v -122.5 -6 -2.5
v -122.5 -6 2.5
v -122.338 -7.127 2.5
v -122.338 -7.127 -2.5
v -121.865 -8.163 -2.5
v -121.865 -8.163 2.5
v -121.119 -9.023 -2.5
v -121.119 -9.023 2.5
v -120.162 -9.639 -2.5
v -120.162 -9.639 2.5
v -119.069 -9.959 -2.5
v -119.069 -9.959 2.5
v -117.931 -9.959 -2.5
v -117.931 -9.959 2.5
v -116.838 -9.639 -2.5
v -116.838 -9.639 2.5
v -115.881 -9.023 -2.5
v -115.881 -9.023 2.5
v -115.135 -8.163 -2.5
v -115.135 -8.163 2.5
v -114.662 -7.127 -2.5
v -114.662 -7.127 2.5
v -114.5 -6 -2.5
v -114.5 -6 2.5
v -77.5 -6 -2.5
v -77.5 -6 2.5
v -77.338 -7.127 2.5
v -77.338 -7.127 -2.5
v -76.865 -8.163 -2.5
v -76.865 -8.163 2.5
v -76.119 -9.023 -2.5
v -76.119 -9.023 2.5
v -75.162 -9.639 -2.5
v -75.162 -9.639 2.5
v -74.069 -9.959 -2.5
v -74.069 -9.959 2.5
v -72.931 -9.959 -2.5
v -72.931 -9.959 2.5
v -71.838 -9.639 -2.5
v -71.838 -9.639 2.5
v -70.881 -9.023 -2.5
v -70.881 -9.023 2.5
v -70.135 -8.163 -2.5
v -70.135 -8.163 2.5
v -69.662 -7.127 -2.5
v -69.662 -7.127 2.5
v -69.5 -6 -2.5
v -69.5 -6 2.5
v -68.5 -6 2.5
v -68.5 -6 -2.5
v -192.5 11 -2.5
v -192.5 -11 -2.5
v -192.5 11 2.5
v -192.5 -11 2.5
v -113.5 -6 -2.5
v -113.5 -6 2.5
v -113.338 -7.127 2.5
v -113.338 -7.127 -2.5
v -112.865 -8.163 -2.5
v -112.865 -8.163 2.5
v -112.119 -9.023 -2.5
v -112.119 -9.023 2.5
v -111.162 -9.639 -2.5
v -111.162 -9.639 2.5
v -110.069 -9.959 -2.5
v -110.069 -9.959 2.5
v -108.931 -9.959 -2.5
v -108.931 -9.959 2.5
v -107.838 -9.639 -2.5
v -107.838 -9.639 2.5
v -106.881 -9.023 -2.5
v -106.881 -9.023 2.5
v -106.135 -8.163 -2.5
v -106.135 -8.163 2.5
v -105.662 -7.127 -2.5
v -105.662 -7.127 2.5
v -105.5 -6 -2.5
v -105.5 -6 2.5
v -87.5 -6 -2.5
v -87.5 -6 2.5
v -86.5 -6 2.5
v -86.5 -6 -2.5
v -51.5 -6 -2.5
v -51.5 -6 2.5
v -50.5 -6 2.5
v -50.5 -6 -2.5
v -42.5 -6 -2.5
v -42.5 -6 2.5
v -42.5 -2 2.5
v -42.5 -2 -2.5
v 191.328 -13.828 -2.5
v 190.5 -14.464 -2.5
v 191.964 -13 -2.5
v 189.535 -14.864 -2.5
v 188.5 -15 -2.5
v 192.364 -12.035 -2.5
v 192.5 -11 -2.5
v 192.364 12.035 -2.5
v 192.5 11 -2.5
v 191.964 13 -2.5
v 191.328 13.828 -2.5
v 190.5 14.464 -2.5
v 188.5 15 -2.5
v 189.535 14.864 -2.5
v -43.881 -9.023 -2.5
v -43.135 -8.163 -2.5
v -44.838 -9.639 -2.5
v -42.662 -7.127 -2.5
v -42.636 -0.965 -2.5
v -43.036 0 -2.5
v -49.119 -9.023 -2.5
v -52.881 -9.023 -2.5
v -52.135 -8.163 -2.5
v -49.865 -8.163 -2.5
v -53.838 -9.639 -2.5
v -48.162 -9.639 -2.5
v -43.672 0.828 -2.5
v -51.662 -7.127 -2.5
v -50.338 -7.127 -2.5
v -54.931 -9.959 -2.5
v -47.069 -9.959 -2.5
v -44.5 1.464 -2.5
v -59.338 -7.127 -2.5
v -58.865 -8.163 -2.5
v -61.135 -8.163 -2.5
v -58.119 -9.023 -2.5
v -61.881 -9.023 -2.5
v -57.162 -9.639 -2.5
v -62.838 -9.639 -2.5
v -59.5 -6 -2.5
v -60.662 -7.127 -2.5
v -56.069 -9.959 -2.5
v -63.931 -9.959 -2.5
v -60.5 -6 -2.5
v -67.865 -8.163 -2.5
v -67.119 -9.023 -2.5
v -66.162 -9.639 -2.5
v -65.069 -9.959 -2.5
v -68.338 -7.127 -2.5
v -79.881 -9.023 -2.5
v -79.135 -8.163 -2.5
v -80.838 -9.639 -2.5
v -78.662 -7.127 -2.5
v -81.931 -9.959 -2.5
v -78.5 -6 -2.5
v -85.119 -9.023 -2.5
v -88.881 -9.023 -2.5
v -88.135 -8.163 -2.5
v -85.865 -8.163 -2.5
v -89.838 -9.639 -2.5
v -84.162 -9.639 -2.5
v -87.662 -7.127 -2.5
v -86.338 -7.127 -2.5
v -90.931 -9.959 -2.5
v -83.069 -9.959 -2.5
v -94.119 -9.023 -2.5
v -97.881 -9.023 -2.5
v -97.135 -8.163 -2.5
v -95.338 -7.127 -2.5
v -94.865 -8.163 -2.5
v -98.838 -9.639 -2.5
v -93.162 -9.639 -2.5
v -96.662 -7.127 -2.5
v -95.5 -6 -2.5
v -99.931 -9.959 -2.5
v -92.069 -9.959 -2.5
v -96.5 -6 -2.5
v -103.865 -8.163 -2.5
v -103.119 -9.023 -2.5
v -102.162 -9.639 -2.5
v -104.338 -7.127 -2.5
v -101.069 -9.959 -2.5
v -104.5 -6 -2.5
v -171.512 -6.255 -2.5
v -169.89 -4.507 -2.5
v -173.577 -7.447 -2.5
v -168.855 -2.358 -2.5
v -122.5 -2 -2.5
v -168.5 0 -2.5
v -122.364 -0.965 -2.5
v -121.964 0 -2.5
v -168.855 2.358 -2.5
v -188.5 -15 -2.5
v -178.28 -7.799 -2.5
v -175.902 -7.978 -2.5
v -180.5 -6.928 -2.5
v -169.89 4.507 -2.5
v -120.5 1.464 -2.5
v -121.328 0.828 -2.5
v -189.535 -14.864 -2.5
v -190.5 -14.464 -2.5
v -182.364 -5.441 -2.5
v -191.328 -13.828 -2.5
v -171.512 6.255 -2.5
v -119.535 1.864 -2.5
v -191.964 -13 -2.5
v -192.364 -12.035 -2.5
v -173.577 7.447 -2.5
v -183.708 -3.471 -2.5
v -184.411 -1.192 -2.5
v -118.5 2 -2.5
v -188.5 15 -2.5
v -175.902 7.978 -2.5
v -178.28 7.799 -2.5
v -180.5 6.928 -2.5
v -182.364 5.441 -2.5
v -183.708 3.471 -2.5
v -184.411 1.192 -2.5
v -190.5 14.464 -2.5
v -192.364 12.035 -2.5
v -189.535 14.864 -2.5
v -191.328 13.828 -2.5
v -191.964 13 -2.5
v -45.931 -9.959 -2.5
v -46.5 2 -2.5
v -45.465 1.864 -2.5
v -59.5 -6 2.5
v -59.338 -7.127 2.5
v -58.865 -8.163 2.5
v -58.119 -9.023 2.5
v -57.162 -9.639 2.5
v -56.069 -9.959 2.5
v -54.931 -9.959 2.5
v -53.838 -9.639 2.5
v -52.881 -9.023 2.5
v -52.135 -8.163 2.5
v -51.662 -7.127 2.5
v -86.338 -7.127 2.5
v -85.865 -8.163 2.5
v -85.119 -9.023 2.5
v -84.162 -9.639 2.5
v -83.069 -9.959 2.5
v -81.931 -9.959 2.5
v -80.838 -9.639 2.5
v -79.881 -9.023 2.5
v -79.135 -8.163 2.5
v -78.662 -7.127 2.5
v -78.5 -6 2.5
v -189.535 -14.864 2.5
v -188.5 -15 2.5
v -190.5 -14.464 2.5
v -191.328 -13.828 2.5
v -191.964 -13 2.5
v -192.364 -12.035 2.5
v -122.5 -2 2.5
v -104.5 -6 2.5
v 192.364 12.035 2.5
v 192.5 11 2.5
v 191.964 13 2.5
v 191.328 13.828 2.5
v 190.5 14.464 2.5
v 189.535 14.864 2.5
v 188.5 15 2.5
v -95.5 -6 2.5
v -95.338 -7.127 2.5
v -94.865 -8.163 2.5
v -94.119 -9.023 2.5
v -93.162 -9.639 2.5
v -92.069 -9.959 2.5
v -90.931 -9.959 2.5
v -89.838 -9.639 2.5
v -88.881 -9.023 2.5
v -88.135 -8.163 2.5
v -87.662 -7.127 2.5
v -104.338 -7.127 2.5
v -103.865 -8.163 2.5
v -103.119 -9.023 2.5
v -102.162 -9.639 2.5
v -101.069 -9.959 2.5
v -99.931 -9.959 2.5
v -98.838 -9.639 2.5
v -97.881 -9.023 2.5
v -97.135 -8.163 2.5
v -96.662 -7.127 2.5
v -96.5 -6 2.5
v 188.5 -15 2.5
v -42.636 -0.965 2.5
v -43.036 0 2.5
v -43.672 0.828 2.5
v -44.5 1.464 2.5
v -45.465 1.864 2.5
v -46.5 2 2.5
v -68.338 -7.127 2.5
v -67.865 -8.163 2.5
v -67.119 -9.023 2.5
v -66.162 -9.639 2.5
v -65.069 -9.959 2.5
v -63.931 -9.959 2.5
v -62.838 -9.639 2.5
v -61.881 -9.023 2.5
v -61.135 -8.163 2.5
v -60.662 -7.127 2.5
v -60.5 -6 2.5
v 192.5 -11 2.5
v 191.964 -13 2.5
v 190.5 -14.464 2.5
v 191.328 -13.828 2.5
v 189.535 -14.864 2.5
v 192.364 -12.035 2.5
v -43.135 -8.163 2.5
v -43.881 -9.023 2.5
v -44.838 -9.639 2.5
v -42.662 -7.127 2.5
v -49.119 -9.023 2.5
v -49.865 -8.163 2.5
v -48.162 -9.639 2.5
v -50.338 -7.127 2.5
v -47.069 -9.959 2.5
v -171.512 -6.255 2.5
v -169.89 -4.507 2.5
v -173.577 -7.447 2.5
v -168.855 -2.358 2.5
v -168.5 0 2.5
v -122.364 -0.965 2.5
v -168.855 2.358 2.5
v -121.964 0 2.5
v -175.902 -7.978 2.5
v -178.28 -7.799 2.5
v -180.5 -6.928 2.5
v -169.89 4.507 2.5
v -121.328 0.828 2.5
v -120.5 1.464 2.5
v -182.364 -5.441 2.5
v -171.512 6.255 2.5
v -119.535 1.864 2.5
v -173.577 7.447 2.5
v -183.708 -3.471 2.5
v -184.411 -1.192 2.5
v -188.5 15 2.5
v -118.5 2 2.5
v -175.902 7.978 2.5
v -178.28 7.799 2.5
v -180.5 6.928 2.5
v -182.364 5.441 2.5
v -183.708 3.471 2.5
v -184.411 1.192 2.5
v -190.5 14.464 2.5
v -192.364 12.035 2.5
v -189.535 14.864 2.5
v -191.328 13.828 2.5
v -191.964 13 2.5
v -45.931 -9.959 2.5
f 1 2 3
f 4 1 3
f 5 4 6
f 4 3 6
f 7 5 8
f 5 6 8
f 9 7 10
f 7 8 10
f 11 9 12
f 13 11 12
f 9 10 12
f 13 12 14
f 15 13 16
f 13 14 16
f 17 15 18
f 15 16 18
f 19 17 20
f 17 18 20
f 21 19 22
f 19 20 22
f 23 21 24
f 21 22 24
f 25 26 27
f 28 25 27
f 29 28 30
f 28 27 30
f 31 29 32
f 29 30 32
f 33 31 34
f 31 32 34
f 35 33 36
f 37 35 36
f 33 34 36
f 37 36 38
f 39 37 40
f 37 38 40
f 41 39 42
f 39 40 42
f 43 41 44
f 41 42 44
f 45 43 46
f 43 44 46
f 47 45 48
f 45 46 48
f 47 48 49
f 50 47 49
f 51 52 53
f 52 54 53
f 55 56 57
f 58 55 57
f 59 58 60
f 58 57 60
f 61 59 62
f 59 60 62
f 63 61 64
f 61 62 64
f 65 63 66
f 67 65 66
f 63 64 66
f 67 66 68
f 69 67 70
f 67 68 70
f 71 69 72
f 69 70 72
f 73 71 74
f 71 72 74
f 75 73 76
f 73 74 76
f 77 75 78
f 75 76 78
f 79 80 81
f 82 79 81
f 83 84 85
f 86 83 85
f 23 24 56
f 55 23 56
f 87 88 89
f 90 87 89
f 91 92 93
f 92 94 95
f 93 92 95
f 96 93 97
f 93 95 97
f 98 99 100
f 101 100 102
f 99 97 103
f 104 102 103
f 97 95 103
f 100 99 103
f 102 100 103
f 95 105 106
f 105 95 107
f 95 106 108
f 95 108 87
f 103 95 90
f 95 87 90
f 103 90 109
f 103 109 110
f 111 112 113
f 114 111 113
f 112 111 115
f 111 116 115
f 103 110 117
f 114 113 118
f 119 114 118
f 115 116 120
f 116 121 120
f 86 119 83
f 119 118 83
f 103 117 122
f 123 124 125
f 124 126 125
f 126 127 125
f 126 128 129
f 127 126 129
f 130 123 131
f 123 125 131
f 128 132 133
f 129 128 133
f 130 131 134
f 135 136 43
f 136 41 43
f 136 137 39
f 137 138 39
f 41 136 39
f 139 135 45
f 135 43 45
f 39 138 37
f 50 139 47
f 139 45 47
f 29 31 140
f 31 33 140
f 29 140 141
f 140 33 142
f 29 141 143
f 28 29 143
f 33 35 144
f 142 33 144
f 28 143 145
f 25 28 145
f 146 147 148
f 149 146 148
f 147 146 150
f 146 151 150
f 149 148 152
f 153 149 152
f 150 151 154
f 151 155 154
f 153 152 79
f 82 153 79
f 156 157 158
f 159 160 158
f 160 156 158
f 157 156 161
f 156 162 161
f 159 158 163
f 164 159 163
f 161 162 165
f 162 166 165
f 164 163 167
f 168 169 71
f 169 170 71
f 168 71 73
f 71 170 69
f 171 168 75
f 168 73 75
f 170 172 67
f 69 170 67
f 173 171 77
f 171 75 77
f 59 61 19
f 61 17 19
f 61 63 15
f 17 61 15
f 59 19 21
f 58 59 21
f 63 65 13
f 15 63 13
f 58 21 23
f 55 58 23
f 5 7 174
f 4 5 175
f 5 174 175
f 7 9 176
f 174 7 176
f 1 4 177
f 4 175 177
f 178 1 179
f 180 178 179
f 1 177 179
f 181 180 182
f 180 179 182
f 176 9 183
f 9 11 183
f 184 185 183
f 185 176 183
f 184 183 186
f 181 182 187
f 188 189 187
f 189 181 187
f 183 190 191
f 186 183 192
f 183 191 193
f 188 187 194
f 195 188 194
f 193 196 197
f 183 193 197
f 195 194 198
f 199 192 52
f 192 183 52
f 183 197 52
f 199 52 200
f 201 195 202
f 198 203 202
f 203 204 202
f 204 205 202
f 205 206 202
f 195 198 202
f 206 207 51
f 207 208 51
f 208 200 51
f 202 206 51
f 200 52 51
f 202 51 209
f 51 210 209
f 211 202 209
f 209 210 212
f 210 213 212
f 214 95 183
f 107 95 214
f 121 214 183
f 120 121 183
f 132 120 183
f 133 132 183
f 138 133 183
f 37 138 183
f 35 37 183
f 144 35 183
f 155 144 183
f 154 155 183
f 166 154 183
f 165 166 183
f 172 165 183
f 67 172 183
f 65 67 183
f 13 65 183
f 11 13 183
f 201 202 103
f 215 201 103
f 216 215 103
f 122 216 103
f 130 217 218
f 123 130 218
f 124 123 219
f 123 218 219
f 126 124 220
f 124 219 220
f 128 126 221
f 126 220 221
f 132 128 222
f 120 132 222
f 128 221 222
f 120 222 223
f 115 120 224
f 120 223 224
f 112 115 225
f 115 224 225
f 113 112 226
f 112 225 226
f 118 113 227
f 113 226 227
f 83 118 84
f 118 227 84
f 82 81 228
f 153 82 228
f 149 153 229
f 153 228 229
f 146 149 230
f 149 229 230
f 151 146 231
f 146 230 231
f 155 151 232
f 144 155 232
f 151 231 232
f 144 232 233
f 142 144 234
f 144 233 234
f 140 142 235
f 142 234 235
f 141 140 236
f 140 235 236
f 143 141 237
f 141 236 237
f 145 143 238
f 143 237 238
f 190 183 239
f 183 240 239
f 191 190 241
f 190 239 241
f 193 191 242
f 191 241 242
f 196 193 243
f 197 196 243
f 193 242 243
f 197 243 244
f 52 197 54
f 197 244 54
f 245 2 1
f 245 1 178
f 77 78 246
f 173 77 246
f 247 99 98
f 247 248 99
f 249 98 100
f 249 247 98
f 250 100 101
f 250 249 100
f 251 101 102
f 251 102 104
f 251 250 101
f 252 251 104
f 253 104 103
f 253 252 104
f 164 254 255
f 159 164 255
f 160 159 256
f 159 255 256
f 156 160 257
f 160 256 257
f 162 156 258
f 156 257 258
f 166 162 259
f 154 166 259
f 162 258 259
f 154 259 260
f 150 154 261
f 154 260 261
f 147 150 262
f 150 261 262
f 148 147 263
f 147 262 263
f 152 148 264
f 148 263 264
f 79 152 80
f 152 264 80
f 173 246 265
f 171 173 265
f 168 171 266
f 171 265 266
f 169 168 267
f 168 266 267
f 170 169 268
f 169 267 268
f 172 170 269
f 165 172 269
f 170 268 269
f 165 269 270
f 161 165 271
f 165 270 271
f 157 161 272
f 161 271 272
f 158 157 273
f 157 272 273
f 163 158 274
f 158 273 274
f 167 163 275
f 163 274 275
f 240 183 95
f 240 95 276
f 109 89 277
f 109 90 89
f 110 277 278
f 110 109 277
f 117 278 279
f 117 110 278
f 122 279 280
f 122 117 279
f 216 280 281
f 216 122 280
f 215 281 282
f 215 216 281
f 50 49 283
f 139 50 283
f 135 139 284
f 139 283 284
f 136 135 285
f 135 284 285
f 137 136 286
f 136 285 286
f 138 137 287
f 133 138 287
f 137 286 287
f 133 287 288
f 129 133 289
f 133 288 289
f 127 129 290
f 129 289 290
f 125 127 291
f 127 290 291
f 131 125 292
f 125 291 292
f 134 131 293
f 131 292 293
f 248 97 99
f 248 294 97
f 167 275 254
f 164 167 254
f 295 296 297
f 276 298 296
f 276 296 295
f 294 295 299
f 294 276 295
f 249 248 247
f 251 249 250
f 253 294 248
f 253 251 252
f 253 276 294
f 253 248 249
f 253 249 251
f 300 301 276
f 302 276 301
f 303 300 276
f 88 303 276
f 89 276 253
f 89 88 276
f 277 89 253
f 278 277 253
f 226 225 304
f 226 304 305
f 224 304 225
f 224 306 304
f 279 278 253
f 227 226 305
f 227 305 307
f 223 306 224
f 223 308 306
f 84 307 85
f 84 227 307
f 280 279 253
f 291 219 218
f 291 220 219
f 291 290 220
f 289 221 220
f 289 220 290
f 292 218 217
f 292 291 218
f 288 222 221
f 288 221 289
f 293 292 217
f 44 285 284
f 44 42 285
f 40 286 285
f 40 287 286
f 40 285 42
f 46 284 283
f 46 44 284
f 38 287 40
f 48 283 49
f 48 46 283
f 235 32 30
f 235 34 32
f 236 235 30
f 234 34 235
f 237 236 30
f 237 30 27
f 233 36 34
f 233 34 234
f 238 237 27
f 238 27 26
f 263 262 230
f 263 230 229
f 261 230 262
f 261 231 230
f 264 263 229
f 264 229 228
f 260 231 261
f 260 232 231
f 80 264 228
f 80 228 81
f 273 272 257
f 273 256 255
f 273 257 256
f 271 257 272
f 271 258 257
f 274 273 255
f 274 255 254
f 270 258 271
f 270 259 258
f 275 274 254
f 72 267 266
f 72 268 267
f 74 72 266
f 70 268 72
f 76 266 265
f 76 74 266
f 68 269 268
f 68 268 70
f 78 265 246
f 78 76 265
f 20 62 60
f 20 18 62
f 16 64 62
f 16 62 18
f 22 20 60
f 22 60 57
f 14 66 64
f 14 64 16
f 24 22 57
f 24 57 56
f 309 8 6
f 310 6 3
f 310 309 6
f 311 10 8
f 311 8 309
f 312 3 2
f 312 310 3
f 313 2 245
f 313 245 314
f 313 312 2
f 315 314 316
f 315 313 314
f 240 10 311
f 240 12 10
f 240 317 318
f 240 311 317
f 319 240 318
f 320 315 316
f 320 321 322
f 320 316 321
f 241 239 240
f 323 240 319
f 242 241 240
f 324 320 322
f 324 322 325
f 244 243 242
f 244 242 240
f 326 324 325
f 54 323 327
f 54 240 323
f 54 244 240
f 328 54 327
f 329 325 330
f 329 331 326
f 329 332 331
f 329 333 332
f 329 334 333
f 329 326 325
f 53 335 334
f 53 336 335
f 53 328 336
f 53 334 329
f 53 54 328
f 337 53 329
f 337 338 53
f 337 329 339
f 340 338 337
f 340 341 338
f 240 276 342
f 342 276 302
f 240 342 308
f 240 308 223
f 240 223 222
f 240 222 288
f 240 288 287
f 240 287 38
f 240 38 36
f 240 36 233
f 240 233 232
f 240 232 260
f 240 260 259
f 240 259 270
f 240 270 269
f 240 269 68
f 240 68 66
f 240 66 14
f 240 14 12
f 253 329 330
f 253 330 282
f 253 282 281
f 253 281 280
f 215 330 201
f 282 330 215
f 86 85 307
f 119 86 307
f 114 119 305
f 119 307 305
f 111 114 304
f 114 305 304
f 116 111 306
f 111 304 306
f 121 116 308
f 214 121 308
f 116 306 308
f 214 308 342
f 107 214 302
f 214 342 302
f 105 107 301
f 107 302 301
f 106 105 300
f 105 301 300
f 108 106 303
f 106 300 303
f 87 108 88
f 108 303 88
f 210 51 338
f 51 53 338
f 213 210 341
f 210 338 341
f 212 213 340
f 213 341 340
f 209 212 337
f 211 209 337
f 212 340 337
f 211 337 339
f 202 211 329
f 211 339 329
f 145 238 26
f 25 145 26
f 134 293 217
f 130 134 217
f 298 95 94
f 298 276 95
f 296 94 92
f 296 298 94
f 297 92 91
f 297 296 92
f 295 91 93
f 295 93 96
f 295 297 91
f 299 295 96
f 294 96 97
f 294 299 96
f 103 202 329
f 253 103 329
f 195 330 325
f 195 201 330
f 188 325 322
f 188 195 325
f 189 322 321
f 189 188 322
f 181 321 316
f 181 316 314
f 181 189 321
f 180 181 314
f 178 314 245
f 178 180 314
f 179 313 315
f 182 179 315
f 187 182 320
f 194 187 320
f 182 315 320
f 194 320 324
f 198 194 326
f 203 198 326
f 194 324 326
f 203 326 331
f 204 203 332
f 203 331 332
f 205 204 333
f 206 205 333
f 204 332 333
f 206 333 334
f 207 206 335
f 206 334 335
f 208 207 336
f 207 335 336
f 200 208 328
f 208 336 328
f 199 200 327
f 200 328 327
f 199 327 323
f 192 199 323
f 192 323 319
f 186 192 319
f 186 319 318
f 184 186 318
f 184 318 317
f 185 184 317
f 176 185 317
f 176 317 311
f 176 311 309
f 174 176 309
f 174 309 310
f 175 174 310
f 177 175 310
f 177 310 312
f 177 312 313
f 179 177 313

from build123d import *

# Parameters (mm, degrees)
PLAT_W                      = 30
PLAT_H                      = 5
EL_MENT_M_CANO_SOUD_1_DEPTH = 385
ESQUISSE2_R                 = 8
ENL_V_MAT_EXTRU_1_DEPTH     = 10
ESQUISSE3_W                 = 80
ESQUISSE3_H                 = 8
ENL_V_MAT_EXTRU_2_DEPTH     = 10
CONG_1_R                    = 4
ESQUISSE4_R                 = 4
ENL_V_MAT_EXTRU_3_DEPTH     = 10
R_P_TITION_LIN_AIRE1_COUNT  = 9
R_P_TITION_LIN_AIRE1_PITCH  = 9
CONG_2_R                    = 4


with BuildPart() as part:
    # plat → Elément mécano-soudé1 (new body)
    with BuildSketch(Plane.YZ.offset(-192.5)):
        Rectangle(PLAT_W, PLAT_H)
    extrude(amount=EL_MENT_M_CANO_SOUD_1_DEPTH)

    # Esquisse2 → Enlèv. mat.-Extru.1 (cut)
    with BuildSketch(Plane.XY.offset(2.5)):
        with Locations((-176.5, 0)):
            Circle(ESQUISSE2_R)
    extrude(amount=-ENL_V_MAT_EXTRU_1_DEPTH, mode=Mode.SUBTRACT)

    # Esquisse3 → Enlèv. mat.-Extru.2 (cut)
    with BuildSketch(Plane.XY.offset(2.5)):
        with Locations((-82.5, -2)):
            Rectangle(ESQUISSE3_W, ESQUISSE3_H)
    extrude(amount=-ENL_V_MAT_EXTRU_2_DEPTH, mode=Mode.SUBTRACT)

    # Congé1
    cong_1_edges = [part.edges().sort_by_distance(p)[0] for p in [
        (-42.5, 2, 0),
        (-122.5, 2, 0),
    ]]
    fillet(cong_1_edges, radius=CONG_1_R)

    # Esquisse4 → Enlèv. mat.-Extru.3 (cut)
    with BuildSketch(Plane.XY.offset(2.5)):
        with Locations((-118.5, -6)):
            Circle(ESQUISSE4_R)
    enl_v_mat_extru_3 = extrude(amount=-ENL_V_MAT_EXTRU_3_DEPTH, mode=Mode.SUBTRACT)

    # Répétition linéaire1: Enlèv. mat.-Extru.3 ×9
    with Locations(*[(i * R_P_TITION_LIN_AIRE1_PITCH, 0, 0) for i in range(1, R_P_TITION_LIN_AIRE1_COUNT)]):
        add(enl_v_mat_extru_3, mode=Mode.SUBTRACT)

    # Congé2
    cong_2_edges = [part.edges().sort_by_distance(p)[0] for p in [
        (192.5, 15, 0),
        (192.5, -15, 0),
        (-192.5, 15, 0),
        (-192.5, -15, 0),
    ]]
    fillet(cong_2_edges, radius=CONG_2_R)


solid = part.part
